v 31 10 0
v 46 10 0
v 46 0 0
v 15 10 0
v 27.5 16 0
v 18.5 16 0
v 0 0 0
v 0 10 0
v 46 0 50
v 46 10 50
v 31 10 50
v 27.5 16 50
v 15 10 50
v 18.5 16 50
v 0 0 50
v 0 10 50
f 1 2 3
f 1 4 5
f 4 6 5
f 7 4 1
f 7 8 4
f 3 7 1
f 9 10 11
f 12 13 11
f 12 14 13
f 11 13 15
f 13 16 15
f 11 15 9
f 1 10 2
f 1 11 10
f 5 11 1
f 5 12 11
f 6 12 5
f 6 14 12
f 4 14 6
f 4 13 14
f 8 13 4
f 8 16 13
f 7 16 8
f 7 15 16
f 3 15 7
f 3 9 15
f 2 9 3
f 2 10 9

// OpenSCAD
$fn = 32;

// ----------------------------------------------------------------------
// V guide rail: dovetail, 46 mm wide
// ----------------------------------------------------------------------

// --- parameters (mm) ---
rail_w = 46;              // rail width, X
base_t = 10;              // base plate thickness
v_depth = 6;              // V feature depth / height
v_half_w = 8;             // half width of the V at the base face
plate_t = 50;             // rail length, Z (the extrusion height)
top_half_w = 4.5;         // half width at the dovetail top

dovetail_base = 2 * v_half_w;  // dovetail width at the base
dovetail_top = 2 * top_half_w;  // dovetail width at the top

profile = [[0, 0], [46, 0], [46, 10], [31, 10], [27.5, 16], [18.5, 16], [15, 10], [0, 10]];  // primary outline, 8 points, counter clockwise

// --- the one profile operation ---
linear_extrude(height = plate_t) polygon(points = profile);
